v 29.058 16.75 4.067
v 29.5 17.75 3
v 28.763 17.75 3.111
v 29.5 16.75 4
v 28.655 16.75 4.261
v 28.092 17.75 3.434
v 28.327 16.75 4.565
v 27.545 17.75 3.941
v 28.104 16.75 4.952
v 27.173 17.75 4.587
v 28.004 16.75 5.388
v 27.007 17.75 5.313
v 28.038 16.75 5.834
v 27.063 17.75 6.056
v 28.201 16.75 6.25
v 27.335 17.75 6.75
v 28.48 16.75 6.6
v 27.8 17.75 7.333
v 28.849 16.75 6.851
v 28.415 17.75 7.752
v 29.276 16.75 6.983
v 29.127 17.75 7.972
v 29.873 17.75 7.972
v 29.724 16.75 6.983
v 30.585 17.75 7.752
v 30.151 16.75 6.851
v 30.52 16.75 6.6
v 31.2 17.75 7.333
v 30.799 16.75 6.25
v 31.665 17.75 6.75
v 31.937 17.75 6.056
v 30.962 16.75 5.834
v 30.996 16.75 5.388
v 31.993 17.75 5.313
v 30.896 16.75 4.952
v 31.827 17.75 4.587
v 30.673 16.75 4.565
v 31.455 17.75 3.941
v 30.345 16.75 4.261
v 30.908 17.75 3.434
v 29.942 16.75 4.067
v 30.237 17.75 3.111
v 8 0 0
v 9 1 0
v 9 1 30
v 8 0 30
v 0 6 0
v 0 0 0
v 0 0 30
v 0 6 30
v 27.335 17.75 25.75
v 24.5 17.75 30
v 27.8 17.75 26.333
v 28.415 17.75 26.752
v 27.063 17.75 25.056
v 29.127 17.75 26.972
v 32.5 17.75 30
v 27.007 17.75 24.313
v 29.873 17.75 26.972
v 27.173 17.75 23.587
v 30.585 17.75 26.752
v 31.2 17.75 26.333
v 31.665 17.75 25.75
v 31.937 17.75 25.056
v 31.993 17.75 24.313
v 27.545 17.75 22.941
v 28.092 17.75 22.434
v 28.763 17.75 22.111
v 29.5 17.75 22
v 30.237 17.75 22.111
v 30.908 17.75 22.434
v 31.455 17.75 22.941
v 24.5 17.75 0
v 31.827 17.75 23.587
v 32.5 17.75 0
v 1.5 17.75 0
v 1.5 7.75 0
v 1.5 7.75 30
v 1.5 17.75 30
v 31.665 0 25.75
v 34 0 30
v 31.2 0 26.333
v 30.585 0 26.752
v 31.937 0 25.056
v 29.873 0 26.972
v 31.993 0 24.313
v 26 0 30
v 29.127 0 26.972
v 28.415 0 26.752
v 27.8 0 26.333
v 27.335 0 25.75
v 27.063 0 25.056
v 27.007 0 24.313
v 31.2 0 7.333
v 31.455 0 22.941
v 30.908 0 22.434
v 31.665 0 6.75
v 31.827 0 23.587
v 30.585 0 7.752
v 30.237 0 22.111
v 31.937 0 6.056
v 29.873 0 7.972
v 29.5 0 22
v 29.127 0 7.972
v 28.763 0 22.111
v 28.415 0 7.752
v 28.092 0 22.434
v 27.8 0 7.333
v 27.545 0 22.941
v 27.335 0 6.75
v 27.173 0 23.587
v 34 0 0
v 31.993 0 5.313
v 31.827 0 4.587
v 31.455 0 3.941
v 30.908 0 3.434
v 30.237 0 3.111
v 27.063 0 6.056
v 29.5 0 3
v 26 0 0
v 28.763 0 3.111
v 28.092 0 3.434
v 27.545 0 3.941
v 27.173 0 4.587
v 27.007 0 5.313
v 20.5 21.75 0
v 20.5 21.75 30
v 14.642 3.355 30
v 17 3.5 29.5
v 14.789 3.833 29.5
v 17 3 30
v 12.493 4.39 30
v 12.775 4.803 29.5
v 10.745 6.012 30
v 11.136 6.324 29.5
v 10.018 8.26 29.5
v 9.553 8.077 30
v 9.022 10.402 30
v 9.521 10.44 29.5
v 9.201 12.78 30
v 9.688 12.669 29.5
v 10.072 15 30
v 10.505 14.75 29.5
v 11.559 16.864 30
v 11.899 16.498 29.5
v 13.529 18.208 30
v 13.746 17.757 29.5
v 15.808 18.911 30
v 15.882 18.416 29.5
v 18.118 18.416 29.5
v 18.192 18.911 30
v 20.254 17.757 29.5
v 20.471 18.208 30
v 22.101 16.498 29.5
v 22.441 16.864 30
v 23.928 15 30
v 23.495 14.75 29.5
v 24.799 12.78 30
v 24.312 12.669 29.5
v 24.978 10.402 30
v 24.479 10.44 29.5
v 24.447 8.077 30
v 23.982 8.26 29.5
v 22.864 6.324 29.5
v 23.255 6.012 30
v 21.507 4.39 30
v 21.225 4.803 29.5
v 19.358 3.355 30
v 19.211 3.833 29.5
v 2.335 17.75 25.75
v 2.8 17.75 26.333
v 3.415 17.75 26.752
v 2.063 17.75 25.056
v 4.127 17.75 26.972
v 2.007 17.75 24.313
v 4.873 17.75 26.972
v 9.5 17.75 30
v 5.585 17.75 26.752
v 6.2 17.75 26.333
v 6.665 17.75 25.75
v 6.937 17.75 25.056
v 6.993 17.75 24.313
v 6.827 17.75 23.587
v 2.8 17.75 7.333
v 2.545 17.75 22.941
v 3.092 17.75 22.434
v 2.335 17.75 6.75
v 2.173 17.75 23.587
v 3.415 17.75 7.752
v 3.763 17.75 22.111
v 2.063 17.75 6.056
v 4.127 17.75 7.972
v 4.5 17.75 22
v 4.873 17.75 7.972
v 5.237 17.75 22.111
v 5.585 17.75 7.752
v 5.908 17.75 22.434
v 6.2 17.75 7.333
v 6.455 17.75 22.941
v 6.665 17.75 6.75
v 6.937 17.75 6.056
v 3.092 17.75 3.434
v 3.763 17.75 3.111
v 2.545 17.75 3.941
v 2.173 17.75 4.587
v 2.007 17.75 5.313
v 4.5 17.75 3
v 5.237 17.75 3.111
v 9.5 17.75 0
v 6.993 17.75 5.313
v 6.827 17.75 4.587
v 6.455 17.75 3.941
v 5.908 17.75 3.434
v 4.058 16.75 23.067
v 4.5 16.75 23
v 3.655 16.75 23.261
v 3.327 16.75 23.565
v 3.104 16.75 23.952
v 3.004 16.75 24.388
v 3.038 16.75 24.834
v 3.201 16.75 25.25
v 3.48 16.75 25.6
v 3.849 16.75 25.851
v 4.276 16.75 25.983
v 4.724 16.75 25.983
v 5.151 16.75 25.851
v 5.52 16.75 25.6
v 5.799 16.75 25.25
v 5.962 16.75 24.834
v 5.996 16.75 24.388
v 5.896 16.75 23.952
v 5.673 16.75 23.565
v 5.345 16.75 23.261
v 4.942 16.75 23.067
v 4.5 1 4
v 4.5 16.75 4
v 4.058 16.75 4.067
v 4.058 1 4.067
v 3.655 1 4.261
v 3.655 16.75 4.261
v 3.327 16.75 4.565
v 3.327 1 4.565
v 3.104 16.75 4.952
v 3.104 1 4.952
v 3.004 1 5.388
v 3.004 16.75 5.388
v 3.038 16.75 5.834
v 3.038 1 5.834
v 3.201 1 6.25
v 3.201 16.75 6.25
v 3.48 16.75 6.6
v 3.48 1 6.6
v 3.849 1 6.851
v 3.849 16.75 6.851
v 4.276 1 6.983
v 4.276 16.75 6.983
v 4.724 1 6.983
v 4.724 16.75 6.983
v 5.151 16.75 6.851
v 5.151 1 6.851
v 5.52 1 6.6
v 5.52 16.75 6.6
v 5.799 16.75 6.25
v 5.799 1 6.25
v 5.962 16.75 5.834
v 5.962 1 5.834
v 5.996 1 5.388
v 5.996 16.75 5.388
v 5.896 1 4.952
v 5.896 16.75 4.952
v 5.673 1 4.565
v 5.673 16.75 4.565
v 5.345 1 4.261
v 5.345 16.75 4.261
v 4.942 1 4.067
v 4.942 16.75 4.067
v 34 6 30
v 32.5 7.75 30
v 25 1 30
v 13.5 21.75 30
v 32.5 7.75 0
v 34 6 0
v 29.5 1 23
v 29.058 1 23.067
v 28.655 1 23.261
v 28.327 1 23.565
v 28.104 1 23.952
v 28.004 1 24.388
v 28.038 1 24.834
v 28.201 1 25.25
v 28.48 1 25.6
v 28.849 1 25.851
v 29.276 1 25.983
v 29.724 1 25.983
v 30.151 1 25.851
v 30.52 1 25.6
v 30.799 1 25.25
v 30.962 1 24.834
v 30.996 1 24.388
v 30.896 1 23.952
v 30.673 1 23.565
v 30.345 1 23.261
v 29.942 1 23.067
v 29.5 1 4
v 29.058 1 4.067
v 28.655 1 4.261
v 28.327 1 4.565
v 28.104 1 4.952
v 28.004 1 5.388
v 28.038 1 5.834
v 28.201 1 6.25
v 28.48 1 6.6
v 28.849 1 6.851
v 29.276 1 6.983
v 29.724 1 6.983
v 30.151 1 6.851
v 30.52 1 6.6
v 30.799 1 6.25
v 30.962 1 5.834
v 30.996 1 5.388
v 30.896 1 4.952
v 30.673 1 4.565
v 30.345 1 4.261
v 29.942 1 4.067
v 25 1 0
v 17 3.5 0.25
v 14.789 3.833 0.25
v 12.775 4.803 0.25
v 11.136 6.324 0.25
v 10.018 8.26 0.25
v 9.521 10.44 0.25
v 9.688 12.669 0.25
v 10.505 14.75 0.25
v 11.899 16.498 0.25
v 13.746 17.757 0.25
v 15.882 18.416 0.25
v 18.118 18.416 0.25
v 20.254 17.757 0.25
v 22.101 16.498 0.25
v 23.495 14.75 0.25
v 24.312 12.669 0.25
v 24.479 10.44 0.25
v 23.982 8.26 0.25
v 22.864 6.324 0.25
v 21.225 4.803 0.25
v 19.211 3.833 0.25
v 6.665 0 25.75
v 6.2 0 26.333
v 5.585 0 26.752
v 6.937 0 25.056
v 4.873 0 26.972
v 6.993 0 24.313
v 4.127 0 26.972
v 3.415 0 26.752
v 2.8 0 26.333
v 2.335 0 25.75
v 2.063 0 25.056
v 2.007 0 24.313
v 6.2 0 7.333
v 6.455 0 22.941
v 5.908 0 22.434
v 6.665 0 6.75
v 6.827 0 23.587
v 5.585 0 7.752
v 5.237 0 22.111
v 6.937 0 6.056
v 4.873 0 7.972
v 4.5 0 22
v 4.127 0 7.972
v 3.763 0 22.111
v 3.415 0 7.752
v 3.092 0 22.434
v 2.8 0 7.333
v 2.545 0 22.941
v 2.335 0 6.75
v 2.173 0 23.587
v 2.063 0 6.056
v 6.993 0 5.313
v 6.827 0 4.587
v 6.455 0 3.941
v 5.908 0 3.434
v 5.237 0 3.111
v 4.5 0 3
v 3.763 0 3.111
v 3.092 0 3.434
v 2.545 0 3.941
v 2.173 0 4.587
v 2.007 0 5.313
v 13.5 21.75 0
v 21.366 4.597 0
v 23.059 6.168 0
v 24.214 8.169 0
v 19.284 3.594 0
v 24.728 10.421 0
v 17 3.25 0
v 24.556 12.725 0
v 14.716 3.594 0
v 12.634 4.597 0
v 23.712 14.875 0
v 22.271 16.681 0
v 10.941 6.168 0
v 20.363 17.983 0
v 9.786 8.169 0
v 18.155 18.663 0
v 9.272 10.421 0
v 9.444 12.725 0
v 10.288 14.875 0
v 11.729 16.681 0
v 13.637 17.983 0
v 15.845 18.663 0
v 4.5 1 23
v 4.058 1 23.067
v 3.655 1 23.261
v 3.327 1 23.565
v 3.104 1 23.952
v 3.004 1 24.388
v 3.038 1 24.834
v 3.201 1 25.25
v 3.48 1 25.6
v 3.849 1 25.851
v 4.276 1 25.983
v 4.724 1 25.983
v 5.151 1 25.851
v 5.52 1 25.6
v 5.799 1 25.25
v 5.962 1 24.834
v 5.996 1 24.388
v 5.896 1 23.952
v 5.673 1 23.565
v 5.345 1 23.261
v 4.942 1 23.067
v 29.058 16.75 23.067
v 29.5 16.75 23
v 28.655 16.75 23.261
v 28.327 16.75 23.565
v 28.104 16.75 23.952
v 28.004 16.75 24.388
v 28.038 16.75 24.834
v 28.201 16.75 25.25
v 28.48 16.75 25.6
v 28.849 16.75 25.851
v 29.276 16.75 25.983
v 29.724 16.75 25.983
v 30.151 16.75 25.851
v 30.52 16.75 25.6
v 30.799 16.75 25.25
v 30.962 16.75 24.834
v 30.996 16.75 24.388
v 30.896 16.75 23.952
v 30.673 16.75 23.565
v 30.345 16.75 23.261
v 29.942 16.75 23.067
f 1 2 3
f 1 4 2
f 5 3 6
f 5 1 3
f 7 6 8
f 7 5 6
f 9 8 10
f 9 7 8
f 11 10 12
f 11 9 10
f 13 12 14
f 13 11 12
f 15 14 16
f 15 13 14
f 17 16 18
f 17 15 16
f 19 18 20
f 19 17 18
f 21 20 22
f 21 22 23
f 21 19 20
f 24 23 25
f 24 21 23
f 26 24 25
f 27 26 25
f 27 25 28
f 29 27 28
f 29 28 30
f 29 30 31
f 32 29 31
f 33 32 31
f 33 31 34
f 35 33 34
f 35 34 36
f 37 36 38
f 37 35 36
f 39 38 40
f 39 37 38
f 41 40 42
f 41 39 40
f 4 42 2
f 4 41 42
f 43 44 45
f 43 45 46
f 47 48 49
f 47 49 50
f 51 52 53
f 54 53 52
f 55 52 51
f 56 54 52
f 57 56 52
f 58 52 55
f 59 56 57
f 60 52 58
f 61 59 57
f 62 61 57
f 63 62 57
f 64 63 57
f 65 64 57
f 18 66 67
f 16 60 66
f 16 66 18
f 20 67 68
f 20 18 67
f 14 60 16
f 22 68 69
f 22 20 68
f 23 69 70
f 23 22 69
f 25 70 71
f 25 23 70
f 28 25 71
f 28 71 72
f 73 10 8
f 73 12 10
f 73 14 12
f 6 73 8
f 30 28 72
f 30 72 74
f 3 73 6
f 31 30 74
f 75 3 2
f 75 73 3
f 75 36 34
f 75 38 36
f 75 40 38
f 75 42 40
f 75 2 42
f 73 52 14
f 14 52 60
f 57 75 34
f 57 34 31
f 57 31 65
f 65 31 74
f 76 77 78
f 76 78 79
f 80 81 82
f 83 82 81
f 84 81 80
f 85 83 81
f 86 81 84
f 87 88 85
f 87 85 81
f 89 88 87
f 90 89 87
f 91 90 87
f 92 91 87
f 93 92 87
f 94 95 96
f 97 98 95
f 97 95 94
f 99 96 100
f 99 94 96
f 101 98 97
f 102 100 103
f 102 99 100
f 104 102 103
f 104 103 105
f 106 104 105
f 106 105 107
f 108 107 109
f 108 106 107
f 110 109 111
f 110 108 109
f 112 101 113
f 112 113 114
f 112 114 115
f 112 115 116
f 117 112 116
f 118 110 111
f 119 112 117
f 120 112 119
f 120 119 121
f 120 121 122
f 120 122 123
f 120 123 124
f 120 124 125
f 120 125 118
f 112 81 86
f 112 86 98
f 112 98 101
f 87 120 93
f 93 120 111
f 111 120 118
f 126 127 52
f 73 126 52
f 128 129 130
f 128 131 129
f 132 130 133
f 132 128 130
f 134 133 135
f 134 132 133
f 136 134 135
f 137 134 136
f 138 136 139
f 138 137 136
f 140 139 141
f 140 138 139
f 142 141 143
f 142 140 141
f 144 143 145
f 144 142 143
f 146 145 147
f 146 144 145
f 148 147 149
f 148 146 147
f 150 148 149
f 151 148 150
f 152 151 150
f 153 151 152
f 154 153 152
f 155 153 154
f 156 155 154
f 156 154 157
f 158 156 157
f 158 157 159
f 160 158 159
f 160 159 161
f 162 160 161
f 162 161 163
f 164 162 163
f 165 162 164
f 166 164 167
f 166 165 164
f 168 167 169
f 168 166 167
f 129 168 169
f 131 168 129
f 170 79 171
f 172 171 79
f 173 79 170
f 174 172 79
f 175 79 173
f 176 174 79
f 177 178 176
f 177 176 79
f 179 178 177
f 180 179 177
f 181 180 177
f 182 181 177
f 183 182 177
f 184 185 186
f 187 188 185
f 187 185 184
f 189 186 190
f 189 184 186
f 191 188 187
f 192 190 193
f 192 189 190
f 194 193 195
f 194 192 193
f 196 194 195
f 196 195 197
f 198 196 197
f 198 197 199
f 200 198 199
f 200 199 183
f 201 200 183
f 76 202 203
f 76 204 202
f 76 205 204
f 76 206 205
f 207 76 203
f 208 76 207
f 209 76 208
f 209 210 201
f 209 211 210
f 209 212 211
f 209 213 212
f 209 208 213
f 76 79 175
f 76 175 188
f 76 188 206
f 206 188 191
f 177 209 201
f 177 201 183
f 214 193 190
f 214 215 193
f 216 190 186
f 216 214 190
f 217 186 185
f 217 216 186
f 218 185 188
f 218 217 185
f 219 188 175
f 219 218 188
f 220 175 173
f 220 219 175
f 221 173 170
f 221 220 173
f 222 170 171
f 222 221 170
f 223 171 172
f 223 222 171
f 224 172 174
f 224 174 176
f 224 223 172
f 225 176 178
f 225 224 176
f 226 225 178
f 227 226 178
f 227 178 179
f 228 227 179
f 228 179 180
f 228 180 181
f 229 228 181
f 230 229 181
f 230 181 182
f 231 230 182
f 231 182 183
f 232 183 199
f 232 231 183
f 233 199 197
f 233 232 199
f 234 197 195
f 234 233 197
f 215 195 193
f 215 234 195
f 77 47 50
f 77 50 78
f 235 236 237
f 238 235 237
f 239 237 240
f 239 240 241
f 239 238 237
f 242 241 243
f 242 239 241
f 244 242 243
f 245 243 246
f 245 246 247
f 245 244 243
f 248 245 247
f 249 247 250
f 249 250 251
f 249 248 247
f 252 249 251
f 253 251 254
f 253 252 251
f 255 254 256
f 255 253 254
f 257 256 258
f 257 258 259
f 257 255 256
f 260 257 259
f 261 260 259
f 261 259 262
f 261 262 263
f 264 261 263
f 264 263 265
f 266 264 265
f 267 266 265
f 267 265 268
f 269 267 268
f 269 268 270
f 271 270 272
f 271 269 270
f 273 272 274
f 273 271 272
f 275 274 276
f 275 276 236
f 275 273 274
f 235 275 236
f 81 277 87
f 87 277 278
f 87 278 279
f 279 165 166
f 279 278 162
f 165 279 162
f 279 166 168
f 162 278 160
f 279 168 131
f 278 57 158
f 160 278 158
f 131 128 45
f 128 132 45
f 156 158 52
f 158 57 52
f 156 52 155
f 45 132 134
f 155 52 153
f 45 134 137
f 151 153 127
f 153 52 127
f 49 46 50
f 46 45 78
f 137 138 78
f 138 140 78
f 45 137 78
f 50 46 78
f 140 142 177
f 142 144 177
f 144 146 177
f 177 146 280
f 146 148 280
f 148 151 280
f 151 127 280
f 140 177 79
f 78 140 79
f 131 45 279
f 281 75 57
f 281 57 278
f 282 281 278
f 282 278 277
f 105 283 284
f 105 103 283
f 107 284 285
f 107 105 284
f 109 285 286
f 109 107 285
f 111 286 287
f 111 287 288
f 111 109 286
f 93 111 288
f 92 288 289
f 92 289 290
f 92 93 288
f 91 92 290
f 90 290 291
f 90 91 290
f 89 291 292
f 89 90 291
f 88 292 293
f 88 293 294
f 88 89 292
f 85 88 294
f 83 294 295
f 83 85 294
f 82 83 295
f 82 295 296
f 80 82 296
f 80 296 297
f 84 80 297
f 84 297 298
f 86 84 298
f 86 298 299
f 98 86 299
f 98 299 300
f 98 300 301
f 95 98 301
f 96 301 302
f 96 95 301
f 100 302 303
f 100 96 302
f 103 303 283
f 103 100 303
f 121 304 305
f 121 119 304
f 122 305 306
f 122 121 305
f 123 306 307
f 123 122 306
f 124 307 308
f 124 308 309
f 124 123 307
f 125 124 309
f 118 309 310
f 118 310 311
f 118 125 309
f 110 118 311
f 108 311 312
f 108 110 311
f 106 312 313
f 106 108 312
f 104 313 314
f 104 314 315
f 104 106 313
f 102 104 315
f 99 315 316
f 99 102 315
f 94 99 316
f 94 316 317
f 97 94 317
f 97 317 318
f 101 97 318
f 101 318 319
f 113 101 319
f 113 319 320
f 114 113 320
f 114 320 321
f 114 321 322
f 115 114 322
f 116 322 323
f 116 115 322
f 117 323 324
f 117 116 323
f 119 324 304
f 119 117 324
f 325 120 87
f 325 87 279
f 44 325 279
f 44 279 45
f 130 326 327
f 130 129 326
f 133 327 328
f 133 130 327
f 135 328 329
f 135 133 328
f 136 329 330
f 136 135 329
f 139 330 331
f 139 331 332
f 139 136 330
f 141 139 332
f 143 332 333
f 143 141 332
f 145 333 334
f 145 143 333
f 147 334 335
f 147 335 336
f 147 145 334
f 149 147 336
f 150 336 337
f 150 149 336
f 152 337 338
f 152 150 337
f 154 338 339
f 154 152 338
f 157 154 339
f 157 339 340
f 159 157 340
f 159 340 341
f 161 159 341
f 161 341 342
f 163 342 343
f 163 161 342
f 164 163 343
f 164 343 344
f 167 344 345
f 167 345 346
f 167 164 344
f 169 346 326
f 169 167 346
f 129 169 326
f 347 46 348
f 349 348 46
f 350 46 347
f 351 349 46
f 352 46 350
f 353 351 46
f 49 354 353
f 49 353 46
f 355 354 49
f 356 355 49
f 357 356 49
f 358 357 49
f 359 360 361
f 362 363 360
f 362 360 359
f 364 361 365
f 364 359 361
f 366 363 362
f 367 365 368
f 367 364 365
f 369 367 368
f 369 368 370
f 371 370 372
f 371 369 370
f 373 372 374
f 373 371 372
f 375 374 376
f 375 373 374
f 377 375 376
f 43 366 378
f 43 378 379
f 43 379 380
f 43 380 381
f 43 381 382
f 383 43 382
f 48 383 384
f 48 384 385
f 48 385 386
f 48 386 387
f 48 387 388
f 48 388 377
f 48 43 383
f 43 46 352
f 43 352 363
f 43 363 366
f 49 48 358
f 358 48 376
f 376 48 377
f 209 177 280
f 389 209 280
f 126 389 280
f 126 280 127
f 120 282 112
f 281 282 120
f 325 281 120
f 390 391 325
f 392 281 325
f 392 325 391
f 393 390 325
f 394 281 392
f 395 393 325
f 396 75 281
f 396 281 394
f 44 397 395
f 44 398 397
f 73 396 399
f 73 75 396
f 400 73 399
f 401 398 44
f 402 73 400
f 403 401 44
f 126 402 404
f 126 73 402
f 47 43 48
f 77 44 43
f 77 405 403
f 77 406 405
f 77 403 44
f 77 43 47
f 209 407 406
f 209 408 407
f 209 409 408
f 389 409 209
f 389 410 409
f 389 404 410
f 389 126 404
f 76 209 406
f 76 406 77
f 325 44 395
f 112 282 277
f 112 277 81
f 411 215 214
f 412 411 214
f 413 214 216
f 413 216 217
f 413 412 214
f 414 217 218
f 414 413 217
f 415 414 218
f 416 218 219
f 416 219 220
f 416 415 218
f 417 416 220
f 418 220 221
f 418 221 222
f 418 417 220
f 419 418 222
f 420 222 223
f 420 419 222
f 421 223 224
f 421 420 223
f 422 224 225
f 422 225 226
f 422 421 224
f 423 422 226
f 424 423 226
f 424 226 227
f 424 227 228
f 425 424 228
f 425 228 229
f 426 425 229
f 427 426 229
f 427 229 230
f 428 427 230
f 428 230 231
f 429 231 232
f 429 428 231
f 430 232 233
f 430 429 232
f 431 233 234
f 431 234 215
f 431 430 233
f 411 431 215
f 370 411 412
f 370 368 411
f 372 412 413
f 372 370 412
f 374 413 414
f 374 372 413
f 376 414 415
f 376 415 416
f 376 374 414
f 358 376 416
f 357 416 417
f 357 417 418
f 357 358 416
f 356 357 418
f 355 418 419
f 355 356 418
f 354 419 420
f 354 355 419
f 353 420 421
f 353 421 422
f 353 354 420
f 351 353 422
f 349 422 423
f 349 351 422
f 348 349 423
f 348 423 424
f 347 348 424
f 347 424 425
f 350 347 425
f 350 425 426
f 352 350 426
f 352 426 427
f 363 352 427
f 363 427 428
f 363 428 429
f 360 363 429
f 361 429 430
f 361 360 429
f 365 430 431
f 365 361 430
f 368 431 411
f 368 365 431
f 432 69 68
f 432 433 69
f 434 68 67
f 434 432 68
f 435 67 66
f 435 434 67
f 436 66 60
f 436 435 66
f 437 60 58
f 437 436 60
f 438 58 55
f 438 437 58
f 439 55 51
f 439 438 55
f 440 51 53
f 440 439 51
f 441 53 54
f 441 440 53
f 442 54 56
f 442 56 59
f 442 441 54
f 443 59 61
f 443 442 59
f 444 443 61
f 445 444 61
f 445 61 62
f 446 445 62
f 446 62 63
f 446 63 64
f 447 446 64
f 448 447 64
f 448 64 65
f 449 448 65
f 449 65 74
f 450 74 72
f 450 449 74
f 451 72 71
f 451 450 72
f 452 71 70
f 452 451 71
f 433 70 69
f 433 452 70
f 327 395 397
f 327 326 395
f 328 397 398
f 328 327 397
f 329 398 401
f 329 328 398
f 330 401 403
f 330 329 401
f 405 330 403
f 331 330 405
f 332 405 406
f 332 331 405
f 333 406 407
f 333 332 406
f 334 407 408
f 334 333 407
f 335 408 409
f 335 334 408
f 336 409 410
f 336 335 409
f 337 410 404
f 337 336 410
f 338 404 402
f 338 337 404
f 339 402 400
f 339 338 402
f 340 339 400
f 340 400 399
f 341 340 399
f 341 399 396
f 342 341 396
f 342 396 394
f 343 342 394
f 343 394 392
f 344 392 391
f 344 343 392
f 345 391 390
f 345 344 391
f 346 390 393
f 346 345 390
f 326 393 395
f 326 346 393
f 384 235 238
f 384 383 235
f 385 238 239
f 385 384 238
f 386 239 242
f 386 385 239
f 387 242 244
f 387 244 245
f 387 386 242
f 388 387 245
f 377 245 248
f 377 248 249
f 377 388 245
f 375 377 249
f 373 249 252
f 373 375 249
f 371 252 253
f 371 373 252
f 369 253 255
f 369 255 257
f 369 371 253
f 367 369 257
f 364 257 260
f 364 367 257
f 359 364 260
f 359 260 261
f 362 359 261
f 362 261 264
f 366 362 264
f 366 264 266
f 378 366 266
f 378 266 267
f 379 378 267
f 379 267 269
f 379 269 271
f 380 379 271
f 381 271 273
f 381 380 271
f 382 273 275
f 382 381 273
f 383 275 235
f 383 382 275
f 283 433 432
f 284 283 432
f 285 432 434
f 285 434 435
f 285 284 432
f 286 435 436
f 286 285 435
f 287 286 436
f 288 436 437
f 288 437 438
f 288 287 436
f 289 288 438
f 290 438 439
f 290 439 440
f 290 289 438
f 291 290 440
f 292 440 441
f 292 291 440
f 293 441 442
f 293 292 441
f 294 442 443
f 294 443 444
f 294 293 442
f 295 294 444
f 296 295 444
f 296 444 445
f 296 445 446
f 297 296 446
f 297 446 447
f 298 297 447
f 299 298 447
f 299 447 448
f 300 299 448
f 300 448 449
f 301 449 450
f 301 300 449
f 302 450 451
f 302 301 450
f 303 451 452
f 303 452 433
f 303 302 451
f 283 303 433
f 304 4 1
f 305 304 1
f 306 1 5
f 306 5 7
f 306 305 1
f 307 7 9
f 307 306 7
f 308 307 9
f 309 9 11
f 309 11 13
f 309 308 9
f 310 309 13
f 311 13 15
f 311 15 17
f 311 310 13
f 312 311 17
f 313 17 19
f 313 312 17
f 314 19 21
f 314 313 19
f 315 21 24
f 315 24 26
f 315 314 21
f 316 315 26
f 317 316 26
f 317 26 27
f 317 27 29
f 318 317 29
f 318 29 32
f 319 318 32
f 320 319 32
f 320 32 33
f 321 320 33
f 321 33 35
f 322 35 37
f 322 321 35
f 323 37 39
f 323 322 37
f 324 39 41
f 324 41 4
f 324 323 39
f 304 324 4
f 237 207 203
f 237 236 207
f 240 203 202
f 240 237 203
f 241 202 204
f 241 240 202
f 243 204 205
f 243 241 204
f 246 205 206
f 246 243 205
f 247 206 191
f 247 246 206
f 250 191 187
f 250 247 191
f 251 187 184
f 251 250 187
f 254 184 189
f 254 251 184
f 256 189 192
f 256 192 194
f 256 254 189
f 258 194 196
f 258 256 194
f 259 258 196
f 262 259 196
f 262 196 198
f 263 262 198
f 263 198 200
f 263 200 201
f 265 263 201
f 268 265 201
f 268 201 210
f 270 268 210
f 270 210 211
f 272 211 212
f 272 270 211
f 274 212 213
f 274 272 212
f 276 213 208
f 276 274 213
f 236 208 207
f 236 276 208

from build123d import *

# Parameters (mm, degrees)
BOSS_EXTRUDE1_DEPTH        = 30
M5_TAPPED_HOLE5_AT_2_COUNT = 2
M5_TAPPED_HOLE5_AT_2_PITCH = 19
M5_TAPPED_HOLE6_AT_2_COUNT = 2
M5_TAPPED_HOLE6_AT_2_PITCH = 19


with BuildPart() as part:
    # Sketch1 → Boss-Extrude1 (new body)
    with BuildSketch(Plane.XY):
        Polygon((0, 0), (0, 6), (1.5, 7.75), (1.5, 17.75), (9.5, 17.75), (13.5, 21.75), (20.5, 21.75), (24.5, 17.75), (32.5, 17.75), (32.5, 7.75), (34, 6), (34, 0), (26, 0), (25, 1), (9, 1), (8, 0), align=None)
    extrude(amount=BOSS_EXTRUDE1_DEPTH)

    # Sketch4 → CSK for M5 Countersunk Flat Head Screw1 (revolve, cut)
    with BuildSketch(Plane(origin=(17, 11, 30), x_dir=(0, -1, 0), z_dir=(1, 0, 0))):
        Polygon((0, 0), (0, 30), (7.75, 30), (7.5, 29.75), (7.5, 0.5), (8, 0), align=None)
    revolve(axis=Axis((17, 11, 36.35), (0, 0, -1)), mode=Mode.SUBTRACT)

    # Sketch19 → M5 Tapped Hole5 (revolve, cut)
    with BuildSketch(Plane(origin=(29.5, 0, 5.5), x_dir=(0, 0, -1), z_dir=(1, 0, 0))):
        Polygon((0, 0), (0, 17.75), (2.5, 17.75), (1.5, 16.75), (1.5, 1), (2.5, 0), align=None)
    m5_tapped_hole5 = revolve(axis=Axis((29.5, -6.35, 5.5), (0, 1, 0)), mode=Mode.SUBTRACT)

    # M5 Tapped Hole5 at 2: M5 Tapped Hole5 ×2
    with Locations(*[(0, 0, i * M5_TAPPED_HOLE5_AT_2_PITCH) for i in range(1, M5_TAPPED_HOLE5_AT_2_COUNT)]):
        add(m5_tapped_hole5, mode=Mode.SUBTRACT)

    # Sketch21 → M5 Tapped Hole6 (revolve, cut)
    with BuildSketch(Plane(origin=(4.5, 0, 5.5), x_dir=(0, 0, -1), z_dir=(1, 0, 0))):
        Polygon((0, 0), (0, 17.75), (2.5, 17.75), (1.5, 16.75), (1.5, 1), (2.5, 0), align=None)
    m5_tapped_hole6 = revolve(axis=Axis((4.5, -6.35, 5.5), (0, 1, 0)), mode=Mode.SUBTRACT)

    # M5 Tapped Hole6 at 2: M5 Tapped Hole6 ×2
    with Locations(*[(0, 0, i * M5_TAPPED_HOLE6_AT_2_PITCH) for i in range(1, M5_TAPPED_HOLE6_AT_2_COUNT)]):
        add(m5_tapped_hole6, mode=Mode.SUBTRACT)


solid = part.part
